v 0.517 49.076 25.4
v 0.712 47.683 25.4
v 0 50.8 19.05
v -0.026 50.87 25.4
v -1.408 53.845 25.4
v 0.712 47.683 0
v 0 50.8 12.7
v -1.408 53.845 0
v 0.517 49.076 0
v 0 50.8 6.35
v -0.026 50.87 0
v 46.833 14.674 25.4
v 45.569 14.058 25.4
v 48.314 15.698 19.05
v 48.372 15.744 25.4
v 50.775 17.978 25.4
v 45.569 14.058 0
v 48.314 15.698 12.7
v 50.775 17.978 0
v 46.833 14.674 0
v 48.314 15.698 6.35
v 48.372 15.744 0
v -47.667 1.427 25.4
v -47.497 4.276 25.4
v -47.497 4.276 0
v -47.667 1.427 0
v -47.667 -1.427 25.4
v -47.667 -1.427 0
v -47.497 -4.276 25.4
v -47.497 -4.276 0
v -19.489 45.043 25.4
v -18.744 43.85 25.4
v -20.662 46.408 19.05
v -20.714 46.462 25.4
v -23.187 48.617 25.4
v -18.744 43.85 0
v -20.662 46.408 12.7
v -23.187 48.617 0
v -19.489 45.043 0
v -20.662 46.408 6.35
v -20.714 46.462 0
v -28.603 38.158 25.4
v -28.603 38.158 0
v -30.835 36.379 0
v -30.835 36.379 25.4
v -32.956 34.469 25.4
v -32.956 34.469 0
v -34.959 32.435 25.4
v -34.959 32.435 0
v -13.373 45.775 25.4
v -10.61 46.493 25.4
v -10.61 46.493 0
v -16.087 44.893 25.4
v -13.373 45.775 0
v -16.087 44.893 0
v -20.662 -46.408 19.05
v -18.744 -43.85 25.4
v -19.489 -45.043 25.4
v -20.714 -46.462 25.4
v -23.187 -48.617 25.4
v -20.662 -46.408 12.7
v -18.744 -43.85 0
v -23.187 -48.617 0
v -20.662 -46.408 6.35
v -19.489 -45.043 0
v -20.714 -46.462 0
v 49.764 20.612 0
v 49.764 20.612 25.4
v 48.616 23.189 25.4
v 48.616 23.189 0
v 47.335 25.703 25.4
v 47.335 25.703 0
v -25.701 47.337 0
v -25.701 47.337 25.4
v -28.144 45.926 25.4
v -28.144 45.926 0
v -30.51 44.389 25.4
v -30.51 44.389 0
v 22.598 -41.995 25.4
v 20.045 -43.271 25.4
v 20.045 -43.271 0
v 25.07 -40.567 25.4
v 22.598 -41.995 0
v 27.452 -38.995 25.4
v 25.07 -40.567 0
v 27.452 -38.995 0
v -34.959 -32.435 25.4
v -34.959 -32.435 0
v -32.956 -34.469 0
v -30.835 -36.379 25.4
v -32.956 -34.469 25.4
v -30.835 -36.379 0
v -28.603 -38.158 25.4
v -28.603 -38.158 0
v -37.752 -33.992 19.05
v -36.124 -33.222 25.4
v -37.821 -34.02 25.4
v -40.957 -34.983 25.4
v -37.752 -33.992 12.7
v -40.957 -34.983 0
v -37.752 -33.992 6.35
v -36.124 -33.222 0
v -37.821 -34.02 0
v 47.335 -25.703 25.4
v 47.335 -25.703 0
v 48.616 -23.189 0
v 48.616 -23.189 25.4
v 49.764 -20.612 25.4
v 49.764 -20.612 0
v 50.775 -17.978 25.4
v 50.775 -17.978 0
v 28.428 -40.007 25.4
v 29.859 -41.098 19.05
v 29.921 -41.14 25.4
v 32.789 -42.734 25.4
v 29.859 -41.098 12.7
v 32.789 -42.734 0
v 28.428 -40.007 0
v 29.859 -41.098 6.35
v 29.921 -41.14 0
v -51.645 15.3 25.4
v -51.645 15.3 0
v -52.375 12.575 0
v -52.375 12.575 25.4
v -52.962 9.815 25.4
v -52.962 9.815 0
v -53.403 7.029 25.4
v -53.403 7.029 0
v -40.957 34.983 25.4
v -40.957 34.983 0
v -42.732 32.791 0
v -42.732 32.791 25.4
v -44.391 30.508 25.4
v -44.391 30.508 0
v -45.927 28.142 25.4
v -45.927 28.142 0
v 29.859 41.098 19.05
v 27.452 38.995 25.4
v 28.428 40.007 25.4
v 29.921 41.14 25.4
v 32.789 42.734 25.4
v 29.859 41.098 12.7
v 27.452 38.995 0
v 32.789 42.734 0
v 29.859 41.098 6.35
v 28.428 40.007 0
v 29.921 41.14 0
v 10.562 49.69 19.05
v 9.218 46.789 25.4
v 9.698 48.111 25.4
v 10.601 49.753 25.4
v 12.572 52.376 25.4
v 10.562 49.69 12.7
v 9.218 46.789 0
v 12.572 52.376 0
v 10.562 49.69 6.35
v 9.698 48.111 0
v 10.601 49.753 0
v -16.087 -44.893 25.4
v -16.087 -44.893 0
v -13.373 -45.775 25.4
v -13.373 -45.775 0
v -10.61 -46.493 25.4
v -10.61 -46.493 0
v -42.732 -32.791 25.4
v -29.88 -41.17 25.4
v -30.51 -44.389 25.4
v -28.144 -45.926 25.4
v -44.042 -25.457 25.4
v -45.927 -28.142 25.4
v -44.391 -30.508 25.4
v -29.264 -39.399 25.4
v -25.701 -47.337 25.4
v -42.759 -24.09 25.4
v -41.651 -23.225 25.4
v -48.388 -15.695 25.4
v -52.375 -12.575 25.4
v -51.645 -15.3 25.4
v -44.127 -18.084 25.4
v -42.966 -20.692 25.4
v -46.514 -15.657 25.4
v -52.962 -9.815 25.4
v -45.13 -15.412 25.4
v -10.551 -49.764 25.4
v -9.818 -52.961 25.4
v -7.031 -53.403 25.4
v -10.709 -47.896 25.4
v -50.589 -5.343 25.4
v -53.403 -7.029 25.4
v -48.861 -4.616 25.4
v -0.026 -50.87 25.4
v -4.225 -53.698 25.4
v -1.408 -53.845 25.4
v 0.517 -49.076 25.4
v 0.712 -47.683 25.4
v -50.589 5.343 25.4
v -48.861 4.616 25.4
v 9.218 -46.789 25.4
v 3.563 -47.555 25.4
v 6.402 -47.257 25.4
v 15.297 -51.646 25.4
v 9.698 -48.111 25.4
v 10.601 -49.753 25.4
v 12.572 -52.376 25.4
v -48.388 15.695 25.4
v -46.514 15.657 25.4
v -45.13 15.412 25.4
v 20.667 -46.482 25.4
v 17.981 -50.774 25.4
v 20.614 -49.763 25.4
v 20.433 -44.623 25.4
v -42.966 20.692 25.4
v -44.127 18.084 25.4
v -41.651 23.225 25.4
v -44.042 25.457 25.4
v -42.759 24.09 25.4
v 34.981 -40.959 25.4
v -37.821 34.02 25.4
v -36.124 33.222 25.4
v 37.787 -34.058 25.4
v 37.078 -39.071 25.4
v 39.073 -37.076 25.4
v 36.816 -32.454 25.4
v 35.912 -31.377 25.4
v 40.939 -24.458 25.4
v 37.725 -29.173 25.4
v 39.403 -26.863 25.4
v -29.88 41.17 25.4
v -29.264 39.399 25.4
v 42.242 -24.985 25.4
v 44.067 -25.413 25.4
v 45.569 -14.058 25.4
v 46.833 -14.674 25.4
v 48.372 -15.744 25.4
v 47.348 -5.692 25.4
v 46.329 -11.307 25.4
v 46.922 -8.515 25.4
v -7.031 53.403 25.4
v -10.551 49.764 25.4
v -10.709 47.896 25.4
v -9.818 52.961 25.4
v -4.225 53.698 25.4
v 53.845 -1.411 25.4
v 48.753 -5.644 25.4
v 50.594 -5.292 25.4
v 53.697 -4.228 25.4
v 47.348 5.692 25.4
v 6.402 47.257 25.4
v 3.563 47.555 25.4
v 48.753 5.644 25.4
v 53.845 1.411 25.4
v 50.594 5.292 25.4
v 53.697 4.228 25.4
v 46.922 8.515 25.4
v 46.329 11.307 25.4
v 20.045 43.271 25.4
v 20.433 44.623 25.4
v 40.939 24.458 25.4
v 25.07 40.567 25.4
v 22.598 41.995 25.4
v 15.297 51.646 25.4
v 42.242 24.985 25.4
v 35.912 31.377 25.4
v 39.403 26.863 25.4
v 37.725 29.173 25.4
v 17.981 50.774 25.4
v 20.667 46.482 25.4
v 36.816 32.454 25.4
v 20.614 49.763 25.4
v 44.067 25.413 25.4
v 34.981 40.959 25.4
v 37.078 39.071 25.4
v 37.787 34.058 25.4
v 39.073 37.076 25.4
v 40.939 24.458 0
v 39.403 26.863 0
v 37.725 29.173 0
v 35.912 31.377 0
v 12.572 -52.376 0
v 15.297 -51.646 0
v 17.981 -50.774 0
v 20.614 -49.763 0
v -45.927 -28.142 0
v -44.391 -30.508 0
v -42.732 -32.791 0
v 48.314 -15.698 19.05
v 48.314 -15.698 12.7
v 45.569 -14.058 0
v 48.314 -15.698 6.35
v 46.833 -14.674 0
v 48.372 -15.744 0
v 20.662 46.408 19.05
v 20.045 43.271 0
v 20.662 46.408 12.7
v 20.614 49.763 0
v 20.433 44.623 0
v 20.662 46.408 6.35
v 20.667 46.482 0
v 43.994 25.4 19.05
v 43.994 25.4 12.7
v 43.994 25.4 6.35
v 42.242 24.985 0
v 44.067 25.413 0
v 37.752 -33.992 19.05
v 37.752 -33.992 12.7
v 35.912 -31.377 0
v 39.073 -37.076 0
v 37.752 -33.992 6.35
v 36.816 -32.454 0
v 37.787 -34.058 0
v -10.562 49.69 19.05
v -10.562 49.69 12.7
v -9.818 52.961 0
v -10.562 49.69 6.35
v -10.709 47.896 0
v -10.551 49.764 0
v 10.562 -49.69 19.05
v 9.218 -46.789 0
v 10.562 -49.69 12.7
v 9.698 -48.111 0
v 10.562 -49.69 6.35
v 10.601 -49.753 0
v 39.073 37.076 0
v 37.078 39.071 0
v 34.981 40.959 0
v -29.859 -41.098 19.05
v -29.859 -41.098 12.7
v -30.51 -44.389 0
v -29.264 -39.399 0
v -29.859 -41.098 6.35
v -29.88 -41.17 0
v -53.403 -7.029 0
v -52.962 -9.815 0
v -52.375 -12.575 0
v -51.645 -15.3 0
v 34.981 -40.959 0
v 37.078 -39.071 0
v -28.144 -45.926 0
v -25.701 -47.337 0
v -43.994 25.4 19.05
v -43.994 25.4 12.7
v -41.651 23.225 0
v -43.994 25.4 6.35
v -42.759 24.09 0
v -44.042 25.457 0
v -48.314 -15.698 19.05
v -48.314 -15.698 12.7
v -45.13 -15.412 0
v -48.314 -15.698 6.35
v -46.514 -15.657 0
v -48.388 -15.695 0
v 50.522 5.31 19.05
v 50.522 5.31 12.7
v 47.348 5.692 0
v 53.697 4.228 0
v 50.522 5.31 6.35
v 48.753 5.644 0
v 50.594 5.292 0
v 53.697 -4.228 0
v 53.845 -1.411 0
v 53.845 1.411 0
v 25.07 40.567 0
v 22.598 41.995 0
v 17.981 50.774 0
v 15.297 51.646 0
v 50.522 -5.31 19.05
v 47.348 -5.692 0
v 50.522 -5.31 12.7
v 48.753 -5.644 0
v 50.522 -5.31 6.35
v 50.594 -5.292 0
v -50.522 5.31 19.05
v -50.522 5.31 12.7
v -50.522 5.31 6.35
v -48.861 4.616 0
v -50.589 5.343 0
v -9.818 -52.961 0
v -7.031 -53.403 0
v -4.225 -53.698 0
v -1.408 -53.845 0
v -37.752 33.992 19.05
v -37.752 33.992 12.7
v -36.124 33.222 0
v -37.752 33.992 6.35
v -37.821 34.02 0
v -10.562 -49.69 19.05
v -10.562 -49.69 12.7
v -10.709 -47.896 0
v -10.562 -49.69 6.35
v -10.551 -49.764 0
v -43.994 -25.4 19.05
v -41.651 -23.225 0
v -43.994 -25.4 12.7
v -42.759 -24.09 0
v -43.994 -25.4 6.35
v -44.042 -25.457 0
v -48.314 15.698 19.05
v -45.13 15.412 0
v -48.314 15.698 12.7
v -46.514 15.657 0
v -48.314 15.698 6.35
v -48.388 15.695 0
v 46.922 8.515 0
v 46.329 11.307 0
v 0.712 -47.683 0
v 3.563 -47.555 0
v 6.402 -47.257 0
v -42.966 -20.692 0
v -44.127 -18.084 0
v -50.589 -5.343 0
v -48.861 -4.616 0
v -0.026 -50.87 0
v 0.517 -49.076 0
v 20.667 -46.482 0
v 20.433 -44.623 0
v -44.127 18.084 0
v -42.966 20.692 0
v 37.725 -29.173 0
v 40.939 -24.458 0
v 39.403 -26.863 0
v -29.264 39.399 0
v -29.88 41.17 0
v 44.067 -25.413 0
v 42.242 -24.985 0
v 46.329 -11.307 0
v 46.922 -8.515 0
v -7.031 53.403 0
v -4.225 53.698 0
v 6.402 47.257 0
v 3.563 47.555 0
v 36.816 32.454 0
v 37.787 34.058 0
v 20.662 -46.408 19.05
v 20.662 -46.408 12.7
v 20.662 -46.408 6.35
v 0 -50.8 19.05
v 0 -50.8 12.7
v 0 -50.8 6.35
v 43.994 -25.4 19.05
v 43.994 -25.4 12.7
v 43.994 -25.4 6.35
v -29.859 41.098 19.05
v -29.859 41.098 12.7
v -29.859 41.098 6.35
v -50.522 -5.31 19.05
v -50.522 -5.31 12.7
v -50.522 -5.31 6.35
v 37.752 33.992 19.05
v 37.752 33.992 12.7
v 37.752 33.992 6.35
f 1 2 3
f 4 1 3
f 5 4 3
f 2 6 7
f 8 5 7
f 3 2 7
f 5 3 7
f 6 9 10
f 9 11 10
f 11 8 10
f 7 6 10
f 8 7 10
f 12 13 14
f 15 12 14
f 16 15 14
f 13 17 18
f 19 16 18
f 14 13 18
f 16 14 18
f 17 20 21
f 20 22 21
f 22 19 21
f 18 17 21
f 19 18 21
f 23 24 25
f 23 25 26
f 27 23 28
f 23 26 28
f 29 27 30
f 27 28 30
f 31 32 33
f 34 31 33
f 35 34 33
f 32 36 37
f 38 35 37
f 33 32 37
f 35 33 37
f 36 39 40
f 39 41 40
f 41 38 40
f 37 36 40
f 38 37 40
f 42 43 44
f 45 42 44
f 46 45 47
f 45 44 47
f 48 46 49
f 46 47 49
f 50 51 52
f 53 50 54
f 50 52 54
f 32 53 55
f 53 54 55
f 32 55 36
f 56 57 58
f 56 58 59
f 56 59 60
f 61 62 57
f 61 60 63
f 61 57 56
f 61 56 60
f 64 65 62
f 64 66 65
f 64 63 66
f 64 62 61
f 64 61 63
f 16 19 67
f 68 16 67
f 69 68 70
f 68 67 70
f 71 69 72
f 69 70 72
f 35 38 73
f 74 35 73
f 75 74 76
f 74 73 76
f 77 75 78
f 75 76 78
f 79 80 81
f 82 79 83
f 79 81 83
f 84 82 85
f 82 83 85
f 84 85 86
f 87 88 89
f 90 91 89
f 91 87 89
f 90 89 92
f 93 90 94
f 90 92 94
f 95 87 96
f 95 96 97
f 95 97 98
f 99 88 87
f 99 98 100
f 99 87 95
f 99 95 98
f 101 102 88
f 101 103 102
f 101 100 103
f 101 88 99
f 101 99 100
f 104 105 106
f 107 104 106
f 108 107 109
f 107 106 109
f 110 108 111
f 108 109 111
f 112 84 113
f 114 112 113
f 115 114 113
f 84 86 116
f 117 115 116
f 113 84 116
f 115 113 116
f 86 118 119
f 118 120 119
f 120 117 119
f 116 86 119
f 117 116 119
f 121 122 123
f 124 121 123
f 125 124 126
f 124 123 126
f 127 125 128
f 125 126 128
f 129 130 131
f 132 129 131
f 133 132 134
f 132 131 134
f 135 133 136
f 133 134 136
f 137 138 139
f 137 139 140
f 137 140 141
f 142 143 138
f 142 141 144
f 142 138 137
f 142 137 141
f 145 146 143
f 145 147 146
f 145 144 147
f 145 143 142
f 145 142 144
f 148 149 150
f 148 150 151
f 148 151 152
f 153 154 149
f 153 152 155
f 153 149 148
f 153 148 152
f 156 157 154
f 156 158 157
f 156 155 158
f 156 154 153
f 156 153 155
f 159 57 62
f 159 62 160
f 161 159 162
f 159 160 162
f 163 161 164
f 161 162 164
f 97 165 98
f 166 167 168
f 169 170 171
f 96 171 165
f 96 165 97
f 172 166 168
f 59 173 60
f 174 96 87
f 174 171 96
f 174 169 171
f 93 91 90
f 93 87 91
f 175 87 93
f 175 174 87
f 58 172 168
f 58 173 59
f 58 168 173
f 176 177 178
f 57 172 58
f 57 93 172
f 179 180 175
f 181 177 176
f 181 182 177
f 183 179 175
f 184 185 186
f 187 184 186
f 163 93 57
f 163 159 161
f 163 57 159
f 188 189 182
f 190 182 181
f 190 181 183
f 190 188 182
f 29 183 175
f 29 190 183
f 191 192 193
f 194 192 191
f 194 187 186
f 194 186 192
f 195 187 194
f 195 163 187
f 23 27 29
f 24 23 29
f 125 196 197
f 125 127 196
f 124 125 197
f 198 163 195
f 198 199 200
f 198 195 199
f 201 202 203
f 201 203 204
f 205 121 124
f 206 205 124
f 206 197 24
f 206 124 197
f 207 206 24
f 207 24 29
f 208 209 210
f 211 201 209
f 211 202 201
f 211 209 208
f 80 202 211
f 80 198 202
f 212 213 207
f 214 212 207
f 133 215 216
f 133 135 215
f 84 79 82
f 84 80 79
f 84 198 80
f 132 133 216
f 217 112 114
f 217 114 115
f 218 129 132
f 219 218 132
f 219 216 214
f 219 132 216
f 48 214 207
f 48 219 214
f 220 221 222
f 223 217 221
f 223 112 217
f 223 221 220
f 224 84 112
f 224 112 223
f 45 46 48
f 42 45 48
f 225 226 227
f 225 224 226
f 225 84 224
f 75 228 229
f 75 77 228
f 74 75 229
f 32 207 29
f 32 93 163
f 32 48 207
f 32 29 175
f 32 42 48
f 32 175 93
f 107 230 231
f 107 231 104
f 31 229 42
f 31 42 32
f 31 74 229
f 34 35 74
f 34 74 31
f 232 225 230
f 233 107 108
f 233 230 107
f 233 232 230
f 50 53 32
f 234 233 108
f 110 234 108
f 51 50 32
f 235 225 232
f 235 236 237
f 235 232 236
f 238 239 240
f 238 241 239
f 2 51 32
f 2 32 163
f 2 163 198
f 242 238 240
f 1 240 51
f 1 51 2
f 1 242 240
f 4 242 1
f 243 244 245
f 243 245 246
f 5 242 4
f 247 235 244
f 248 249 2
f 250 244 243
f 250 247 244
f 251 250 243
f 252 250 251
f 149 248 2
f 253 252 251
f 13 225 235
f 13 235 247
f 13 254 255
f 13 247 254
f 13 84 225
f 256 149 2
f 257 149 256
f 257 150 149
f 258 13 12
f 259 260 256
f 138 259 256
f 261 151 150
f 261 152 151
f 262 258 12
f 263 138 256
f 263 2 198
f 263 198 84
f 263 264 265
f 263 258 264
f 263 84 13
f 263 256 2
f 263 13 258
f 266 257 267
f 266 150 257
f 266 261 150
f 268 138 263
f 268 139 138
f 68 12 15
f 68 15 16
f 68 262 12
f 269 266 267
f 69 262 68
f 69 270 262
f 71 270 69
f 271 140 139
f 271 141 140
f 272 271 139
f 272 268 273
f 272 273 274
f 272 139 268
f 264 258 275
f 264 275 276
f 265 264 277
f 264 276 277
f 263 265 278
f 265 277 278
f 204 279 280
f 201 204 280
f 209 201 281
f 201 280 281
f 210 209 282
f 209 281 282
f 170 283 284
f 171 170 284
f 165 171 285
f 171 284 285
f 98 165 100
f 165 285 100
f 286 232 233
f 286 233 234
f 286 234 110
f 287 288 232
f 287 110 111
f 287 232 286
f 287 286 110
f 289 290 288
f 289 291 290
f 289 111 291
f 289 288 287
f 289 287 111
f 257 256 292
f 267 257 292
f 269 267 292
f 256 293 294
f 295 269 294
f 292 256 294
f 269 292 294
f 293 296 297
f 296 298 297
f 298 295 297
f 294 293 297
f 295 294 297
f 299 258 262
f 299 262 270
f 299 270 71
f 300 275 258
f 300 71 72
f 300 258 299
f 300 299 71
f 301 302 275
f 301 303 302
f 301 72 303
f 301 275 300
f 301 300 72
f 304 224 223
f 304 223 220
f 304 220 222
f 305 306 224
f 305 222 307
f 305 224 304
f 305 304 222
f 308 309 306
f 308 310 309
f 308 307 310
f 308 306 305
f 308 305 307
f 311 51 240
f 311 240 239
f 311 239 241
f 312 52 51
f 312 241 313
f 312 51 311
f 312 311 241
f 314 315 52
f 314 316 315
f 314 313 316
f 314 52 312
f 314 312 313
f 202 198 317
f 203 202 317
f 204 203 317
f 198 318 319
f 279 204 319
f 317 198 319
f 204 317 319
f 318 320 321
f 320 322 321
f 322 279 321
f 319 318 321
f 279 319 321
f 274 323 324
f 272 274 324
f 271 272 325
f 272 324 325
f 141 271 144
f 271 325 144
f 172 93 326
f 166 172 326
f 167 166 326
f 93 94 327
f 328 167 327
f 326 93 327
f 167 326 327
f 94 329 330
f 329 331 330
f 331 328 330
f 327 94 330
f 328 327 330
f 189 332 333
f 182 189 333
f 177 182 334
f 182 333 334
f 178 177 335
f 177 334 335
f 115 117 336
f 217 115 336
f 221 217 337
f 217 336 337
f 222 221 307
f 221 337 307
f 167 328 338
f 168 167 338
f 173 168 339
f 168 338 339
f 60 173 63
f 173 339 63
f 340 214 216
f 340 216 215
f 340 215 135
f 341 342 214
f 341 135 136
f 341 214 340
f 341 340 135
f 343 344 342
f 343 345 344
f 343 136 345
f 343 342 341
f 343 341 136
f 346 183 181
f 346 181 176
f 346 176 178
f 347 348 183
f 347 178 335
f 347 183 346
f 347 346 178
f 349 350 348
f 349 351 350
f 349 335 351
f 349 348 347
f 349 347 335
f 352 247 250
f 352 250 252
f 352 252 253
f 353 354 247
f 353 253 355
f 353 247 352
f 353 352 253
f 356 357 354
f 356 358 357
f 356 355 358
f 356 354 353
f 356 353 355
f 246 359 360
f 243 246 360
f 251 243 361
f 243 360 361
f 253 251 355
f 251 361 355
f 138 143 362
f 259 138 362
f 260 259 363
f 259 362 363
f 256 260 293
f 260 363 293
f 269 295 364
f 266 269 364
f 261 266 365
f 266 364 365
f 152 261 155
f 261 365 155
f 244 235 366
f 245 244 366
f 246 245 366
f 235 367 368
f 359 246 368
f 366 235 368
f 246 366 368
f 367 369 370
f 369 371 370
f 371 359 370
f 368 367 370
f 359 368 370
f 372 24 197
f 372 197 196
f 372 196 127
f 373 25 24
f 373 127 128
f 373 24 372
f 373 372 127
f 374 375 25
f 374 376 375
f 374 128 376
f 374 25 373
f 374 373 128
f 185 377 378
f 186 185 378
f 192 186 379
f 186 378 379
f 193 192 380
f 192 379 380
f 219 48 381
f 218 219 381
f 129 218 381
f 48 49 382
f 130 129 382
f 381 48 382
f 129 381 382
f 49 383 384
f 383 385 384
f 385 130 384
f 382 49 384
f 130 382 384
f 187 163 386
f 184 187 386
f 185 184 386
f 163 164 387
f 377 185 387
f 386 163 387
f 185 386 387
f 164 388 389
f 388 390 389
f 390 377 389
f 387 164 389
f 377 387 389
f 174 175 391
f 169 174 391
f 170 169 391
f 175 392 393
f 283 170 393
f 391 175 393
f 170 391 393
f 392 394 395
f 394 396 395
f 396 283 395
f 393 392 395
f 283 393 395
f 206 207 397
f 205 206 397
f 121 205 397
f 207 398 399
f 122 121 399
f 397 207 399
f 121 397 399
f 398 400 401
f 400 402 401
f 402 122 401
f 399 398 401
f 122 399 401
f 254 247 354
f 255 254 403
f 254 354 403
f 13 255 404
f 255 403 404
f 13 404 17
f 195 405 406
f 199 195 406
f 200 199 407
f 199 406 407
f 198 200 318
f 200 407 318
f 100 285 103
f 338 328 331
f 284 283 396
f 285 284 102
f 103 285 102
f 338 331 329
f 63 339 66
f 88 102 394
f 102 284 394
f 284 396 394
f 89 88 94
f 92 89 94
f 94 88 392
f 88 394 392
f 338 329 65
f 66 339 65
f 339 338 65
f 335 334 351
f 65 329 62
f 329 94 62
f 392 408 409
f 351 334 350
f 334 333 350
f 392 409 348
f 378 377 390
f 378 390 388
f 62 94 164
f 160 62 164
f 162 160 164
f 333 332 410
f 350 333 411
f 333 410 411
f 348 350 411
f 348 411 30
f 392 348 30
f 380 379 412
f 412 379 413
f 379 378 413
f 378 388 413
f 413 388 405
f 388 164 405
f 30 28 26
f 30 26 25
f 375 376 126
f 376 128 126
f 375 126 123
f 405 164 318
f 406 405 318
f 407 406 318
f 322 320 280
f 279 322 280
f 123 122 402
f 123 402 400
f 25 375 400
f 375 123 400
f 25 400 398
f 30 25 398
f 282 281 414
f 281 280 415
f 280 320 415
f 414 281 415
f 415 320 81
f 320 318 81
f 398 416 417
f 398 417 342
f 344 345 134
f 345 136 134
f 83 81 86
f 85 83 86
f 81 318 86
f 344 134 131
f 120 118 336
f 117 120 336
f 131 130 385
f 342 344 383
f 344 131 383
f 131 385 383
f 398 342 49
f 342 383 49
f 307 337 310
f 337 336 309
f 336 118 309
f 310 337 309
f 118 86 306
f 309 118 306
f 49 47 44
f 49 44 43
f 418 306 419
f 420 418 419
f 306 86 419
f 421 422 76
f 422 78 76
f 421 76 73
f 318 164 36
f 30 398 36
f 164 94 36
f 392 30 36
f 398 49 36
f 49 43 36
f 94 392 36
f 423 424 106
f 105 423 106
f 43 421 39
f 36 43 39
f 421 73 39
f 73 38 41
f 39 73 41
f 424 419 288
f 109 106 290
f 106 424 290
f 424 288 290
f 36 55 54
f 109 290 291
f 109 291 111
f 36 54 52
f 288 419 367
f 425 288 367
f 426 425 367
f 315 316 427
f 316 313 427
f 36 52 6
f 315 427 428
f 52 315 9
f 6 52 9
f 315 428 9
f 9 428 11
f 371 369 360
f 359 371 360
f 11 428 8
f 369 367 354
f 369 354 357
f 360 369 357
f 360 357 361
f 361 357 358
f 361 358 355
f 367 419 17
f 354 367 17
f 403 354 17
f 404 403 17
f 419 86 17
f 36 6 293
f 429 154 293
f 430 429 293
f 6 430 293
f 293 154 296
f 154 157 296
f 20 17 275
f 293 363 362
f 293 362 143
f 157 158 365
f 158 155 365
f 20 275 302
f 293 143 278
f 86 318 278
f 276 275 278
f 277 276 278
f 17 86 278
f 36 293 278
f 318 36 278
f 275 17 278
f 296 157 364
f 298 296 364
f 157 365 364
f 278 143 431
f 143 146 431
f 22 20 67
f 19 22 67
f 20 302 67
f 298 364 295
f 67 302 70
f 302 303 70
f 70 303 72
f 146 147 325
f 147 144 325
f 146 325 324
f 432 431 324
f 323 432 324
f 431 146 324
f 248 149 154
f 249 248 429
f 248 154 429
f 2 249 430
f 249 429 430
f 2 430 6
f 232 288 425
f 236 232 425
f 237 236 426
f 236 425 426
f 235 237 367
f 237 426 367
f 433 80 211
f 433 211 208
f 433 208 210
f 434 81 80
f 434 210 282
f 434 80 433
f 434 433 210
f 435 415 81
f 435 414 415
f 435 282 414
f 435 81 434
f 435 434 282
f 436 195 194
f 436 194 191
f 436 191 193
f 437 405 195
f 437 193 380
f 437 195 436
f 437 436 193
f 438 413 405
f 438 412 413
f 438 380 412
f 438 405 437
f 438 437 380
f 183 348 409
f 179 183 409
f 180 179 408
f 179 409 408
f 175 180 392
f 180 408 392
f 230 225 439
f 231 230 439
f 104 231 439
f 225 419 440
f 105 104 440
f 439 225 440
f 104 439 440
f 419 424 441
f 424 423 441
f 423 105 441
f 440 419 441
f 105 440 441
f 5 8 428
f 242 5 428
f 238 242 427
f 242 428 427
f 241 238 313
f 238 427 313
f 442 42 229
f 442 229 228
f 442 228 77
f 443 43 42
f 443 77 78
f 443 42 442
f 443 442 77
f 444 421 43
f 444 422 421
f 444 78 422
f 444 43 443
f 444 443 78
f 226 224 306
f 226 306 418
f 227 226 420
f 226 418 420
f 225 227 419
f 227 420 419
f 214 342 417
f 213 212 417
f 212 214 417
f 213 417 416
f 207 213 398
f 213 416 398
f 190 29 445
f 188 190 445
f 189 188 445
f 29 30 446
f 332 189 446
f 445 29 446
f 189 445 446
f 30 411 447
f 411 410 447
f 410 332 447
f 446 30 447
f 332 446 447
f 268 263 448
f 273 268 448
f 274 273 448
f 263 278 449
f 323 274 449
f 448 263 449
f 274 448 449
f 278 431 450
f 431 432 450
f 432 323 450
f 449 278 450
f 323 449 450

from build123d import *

# Parameters (mm, degrees)
SKETCH6_R           = 47.688639705
BOSS_EXTRUDE3_DEPTH = 25.4
BOSS_EXTRUDE4_DEPTH = 25.4
CIRPATTERN1_COUNT   = 15


with BuildPart() as part:
    # Sketch6 → Boss-Extrude3 (new body)
    with BuildSketch(Plane.XY):
        Circle(SKETCH6_R)
    extrude(amount=BOSS_EXTRUDE3_DEPTH)

    # Sketch5 → Boss-Extrude4 (add)
    with BuildSketch(Plane.XY):
        with BuildLine():
            ThreePointArc((-1.408071238, 53.84520723), (-5.630280888, 53.568544346), (-9.817746575, 52.961314735))
            add(Edge.make_bspline(
                [(-10.610061638, 46.493364569), (-10.709772142, 47.029021497), (-10.734707714, 48.102849794), (-10.568826593, 49.872777698), (-10.241208192, 51.488329618), (-9.939095864, 52.566483824), (-9.817746575, 52.961314735)],
                knots=[0, 0, 0, 0, 0.145749794, 0.286840016, 0.476245084, 0.587002811, 0.587002811, 0.587002811, 0.587002811], degree=3))
            ThreePointArc((-10.610061638, 46.493364569), (-4.984820224, 47.427396347), (0.711692296, 47.683328858))
            add(Edge.make_bspline(
                [(0.711692296, 47.683328858), (0.697854548, 48.228011376), (0.498983761, 49.283558346), (-0.031261162, 50.980320455), (-0.687612447, 52.492452993), (-1.207283759, 53.484234257), (-1.408071238, 53.84520723)],
                knots=[0, 0, 0, 0, 0.145749794, 0.286840016, 0.476245084, 0.587002811, 0.587002811, 0.587002811, 0.587002811], degree=3))
        make_face()
    boss_extrude4 = extrude(amount=BOSS_EXTRUDE4_DEPTH)

    # CirPattern1: Boss-Extrude4 ×15 about axis
    cirpattern1_axis = Axis((0, 0, 25.4), (0, 0, 1))
    for i in range(1, CIRPATTERN1_COUNT):
        add(boss_extrude4.rotate(cirpattern1_axis, i * 360 / CIRPATTERN1_COUNT))


solid = part.part
